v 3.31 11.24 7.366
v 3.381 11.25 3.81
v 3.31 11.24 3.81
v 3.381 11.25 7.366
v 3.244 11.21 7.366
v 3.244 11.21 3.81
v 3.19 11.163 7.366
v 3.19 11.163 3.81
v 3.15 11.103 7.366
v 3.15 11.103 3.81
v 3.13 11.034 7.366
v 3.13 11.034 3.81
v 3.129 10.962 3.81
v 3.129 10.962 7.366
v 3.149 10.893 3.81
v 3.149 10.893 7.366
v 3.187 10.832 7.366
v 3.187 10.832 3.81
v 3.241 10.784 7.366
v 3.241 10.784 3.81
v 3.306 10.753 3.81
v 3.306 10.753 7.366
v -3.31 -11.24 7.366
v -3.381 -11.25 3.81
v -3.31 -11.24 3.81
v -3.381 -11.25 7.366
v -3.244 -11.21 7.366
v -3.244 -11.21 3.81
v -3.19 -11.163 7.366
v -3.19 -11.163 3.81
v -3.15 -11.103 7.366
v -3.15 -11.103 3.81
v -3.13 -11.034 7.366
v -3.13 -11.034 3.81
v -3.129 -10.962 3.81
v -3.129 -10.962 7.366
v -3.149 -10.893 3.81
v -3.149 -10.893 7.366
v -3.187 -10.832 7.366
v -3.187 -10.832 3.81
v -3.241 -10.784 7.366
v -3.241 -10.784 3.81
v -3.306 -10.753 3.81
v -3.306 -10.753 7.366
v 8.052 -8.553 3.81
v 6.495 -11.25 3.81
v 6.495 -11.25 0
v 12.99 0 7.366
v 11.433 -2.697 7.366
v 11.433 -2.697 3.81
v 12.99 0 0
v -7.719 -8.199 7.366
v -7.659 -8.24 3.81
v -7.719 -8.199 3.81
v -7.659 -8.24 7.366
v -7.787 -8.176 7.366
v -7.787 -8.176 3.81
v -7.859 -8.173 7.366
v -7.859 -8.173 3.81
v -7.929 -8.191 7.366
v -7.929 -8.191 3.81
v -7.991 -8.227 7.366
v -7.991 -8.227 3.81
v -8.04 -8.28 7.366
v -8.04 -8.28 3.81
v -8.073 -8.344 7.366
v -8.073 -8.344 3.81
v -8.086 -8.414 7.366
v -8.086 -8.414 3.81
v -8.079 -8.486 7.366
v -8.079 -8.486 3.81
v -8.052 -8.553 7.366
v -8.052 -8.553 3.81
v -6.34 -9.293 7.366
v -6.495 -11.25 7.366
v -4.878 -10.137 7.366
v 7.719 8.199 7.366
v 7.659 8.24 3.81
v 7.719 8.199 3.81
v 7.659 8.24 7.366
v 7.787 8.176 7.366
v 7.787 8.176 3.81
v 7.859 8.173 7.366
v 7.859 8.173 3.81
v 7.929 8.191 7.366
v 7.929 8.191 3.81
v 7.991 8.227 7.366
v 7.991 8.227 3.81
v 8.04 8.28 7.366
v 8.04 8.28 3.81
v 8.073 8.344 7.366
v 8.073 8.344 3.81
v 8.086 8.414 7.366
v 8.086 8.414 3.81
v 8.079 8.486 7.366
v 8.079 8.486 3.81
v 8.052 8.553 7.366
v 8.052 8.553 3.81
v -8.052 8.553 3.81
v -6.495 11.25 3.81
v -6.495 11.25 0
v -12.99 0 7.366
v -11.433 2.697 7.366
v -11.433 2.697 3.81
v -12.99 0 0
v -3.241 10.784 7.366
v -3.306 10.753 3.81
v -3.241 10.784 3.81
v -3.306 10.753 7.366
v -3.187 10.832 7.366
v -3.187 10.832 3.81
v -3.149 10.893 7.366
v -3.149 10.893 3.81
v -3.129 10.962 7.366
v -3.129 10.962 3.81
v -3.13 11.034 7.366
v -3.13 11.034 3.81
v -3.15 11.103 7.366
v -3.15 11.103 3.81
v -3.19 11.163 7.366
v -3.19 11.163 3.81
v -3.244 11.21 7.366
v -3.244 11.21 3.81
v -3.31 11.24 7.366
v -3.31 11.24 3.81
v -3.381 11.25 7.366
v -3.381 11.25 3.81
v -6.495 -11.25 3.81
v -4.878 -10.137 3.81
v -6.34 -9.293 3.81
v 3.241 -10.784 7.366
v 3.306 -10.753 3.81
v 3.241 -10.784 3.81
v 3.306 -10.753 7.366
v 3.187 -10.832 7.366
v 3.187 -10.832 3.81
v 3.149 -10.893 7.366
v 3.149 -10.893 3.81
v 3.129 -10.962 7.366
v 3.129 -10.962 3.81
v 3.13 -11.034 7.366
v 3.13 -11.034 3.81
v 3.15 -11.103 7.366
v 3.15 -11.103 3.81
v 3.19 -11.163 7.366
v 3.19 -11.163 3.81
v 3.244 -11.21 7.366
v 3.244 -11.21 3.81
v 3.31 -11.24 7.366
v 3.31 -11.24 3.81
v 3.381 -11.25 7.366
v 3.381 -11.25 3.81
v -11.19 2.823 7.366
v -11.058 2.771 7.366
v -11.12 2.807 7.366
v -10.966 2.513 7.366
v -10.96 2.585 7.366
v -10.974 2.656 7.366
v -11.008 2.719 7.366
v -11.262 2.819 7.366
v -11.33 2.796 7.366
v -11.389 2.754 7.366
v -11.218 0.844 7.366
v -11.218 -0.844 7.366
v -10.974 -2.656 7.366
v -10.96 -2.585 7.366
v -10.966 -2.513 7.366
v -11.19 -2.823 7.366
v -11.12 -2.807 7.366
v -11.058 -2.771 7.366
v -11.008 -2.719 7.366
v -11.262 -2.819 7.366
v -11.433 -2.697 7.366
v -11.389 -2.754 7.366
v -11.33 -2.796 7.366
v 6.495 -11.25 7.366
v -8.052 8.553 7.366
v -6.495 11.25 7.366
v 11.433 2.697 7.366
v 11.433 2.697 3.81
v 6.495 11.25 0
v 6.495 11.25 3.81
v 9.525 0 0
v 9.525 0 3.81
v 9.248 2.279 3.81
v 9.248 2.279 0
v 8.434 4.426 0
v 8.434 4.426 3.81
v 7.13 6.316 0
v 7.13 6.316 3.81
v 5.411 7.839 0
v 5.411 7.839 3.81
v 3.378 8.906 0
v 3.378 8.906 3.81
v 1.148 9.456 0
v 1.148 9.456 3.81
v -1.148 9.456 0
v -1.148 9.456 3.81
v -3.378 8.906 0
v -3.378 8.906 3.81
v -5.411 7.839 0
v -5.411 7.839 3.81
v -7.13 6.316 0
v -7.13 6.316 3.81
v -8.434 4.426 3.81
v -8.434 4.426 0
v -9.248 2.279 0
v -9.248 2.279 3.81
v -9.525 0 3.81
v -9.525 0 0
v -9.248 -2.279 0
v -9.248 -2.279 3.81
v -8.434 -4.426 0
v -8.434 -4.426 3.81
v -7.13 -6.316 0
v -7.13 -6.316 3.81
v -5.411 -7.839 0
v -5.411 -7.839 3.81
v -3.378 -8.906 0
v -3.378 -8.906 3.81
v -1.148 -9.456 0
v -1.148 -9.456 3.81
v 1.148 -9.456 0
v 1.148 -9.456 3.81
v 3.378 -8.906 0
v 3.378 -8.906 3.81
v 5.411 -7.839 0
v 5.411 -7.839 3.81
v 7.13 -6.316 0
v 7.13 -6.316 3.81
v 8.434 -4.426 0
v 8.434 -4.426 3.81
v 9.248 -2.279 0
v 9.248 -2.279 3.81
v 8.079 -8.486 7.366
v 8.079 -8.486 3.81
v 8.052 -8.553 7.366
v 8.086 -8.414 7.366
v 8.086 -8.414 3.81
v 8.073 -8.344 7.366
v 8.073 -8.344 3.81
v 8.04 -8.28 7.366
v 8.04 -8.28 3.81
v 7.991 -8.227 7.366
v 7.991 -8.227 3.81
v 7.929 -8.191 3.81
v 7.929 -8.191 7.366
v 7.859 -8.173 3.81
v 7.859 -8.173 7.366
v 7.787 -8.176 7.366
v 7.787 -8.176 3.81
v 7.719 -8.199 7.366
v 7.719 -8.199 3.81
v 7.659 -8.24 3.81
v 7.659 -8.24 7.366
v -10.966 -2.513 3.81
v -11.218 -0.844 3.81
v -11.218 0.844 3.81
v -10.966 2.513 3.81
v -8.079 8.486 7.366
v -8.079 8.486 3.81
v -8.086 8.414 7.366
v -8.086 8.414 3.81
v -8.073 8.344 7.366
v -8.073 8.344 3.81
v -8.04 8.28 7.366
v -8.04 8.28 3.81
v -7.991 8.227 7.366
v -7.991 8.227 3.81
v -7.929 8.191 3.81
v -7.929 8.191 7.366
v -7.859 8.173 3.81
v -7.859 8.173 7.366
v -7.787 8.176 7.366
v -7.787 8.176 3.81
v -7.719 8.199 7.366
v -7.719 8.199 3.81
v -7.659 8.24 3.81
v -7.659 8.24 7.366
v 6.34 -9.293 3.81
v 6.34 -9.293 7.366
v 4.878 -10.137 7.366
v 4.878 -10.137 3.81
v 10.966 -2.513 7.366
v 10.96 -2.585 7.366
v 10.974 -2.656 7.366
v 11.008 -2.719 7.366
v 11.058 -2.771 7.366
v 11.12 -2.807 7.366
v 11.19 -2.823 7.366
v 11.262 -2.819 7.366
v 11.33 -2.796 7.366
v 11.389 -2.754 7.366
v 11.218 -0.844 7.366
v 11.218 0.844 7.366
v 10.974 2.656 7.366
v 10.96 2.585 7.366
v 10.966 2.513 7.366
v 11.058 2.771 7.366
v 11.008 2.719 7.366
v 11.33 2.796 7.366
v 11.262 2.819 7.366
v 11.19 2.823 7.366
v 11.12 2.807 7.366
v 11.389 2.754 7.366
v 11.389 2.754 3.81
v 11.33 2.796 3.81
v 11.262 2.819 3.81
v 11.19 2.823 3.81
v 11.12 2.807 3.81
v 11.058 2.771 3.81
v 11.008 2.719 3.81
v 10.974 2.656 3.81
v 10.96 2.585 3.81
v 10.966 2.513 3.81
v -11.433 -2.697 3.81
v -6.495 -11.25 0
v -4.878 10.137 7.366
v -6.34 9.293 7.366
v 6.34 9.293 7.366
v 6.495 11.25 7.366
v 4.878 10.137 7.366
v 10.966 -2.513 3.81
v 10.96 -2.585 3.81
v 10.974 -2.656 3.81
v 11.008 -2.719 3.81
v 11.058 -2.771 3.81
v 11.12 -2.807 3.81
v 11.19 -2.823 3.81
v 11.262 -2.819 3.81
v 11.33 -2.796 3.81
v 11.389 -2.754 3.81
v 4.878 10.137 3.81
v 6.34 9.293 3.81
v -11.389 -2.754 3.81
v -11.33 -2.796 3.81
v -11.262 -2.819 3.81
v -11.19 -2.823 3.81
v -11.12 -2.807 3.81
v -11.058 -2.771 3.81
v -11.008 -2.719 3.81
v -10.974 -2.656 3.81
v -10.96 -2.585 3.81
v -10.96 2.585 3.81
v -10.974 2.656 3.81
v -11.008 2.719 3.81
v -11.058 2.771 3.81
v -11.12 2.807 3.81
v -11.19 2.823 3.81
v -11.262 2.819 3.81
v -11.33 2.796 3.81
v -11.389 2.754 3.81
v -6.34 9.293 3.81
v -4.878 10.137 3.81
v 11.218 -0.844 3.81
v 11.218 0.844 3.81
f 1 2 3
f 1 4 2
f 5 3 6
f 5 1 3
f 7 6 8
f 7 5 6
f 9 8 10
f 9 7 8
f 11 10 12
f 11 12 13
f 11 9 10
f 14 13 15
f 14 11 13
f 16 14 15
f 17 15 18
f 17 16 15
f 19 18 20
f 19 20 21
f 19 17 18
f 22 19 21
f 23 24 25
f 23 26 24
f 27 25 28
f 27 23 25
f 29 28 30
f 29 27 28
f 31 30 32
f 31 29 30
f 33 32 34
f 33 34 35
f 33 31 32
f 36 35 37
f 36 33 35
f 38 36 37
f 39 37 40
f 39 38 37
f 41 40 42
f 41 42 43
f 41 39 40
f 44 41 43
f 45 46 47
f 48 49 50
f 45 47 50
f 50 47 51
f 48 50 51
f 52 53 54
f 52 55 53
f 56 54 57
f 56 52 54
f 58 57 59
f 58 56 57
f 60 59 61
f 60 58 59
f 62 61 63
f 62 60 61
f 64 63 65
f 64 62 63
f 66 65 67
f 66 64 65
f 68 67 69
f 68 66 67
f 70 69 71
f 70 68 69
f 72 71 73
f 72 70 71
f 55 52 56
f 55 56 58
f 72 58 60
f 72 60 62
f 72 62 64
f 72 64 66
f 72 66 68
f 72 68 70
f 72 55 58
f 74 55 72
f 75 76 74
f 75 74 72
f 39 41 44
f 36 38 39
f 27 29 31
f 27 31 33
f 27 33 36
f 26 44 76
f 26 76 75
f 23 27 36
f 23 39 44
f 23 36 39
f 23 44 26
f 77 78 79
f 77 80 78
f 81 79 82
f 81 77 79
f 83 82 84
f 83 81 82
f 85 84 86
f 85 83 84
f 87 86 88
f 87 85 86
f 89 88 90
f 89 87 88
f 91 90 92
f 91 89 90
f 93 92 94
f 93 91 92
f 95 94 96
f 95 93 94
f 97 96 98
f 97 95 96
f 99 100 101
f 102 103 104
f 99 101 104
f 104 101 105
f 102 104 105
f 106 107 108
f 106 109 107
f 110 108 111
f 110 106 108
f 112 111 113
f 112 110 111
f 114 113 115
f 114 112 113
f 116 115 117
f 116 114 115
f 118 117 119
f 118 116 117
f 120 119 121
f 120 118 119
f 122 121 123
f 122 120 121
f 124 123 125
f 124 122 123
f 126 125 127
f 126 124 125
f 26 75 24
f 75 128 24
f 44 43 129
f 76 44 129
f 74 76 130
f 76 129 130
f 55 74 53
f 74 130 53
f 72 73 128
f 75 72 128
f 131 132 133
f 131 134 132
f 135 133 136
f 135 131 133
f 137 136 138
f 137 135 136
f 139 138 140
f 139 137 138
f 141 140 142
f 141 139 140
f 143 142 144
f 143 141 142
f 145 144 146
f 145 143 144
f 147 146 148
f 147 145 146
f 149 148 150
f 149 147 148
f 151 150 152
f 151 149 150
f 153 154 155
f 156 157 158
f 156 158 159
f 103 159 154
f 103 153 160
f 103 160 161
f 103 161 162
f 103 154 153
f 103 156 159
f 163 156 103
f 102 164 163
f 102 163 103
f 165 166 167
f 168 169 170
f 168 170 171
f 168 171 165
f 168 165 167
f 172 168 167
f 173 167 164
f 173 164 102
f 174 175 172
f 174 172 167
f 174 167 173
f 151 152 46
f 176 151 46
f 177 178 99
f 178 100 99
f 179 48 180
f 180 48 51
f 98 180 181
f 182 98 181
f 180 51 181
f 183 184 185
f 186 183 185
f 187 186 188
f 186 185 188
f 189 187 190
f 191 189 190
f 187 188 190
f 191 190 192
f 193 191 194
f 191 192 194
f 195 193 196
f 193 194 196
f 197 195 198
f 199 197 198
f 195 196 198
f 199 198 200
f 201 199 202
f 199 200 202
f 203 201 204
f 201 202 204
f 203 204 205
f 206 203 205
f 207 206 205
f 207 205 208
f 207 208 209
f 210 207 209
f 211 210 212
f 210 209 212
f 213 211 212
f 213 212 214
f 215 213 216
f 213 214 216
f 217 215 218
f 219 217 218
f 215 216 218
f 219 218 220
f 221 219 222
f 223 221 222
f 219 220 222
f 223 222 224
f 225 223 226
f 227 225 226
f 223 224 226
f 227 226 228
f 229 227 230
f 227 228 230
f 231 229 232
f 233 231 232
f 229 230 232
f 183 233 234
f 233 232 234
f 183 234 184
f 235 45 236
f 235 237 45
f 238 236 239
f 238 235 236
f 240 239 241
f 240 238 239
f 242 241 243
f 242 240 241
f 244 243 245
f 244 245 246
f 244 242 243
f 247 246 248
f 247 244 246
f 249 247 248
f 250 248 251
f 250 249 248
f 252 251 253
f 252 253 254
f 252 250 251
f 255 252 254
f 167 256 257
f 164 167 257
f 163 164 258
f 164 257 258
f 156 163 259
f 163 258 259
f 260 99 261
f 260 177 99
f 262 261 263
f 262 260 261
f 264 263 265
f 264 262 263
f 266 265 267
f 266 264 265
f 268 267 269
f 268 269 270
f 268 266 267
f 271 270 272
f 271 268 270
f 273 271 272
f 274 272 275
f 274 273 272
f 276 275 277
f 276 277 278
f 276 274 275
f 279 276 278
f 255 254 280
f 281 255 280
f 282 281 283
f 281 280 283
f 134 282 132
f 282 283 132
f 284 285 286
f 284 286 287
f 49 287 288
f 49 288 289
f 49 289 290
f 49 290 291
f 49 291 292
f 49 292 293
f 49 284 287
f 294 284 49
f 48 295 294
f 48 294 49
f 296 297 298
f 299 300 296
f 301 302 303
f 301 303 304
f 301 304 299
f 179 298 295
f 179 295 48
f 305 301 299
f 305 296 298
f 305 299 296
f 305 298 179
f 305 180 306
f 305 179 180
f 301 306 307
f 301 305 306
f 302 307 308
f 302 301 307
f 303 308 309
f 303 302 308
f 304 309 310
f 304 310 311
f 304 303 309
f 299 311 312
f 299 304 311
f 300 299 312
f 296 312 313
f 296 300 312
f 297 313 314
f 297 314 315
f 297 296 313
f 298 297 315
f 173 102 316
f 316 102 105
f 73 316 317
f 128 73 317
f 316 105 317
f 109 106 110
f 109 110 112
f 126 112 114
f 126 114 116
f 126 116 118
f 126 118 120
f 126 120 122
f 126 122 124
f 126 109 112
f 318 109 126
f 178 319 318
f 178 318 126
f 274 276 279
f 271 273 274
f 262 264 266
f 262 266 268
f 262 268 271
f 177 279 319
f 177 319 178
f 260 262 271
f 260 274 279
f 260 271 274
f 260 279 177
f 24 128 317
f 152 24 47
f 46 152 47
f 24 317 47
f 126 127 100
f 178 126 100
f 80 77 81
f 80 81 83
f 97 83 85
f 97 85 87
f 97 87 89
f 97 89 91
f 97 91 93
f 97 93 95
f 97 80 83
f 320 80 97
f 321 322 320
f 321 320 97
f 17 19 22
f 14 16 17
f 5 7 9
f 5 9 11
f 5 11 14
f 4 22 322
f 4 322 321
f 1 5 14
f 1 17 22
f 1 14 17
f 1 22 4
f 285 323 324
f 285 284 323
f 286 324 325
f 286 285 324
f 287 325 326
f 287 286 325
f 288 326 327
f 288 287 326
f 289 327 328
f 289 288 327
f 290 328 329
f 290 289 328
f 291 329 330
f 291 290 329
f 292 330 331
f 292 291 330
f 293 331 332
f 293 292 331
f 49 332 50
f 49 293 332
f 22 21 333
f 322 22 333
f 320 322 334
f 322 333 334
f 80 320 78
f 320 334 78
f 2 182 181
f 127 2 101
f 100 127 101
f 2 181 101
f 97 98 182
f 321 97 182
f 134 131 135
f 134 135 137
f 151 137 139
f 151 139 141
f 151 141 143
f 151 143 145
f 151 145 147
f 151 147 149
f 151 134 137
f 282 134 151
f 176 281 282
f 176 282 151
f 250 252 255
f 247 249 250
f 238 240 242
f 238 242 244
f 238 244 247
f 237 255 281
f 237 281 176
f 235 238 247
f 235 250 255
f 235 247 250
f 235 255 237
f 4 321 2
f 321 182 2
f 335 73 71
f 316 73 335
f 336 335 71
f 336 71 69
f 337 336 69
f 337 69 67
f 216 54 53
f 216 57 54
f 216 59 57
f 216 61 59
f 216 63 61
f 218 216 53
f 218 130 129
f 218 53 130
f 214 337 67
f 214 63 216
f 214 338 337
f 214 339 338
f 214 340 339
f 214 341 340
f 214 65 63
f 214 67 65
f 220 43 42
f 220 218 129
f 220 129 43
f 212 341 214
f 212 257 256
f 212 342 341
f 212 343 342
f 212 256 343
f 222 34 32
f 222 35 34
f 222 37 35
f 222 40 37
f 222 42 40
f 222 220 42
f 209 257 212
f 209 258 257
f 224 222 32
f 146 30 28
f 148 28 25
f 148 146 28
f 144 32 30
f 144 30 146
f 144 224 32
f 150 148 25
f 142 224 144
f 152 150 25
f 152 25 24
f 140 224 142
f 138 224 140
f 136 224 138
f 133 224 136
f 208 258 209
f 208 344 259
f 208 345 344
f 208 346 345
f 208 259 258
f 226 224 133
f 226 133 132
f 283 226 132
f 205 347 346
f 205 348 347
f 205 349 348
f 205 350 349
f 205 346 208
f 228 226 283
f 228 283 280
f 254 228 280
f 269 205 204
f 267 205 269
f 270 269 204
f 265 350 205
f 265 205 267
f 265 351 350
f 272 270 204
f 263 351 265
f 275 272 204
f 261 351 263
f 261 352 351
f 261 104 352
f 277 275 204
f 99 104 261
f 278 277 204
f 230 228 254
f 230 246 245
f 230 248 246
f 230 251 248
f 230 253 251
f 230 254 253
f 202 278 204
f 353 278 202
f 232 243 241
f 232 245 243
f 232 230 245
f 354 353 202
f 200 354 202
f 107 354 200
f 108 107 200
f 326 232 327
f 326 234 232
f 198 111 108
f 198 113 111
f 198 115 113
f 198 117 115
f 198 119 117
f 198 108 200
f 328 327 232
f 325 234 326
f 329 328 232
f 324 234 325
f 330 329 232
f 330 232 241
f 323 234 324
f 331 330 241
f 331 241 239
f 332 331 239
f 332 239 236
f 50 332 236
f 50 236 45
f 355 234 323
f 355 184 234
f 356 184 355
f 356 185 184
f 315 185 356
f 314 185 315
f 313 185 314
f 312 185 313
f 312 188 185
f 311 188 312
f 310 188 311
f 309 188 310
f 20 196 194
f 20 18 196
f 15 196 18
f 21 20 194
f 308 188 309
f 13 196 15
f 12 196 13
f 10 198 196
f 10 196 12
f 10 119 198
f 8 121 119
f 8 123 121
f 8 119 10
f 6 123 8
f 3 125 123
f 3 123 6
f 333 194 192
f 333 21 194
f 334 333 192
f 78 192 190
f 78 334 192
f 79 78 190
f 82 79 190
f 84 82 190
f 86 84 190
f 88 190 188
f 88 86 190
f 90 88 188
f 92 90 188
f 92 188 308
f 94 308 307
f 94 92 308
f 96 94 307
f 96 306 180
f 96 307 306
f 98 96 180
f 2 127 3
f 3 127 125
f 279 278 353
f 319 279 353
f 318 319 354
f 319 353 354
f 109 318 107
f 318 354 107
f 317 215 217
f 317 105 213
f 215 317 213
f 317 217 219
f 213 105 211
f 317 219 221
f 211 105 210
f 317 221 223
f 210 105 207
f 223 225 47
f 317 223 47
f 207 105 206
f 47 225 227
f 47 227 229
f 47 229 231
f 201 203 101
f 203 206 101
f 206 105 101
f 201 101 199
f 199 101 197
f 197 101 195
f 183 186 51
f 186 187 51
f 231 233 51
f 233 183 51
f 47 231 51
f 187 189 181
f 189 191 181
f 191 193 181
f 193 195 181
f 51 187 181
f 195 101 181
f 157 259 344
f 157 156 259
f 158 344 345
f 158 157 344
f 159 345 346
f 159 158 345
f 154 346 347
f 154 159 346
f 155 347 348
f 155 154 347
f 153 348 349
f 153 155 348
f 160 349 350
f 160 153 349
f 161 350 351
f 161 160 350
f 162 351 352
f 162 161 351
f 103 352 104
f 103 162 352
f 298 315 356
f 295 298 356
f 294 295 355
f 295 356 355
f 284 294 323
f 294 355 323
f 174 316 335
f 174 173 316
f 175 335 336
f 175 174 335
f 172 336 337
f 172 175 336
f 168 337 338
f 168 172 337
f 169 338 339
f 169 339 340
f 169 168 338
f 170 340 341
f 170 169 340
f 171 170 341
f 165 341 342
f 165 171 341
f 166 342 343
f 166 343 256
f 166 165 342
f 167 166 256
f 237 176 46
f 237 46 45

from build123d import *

# Parameters (mm, degrees)
F1_DEPTH = 3.81
F3_DEPTH = 3.556
F4_R     = 0.254
F6_COUNT = 6
F8_R     = 9.525
F9_DEPTH = 3.81


with BuildPart() as f1:
    # F0 (on Top) → F1 (new body)
    with BuildSketch(Plane.XY):
        Polygon((6.4951905284, 11.25), (-6.4951905284, 11.25), (-12.9903810568, 0), (-6.4951905284, -11.25), (6.4951905284, -11.25), (12.9903810568, 0), align=None)
    extrude(amount=F1_DEPTH)

    # F2 (on face) → F3 (join)
    with BuildSketch(Plane.XY.offset(3.81)):
        with BuildLine():
            Line((12.9903810568, 0), (9.7427857926, 5.625))
            ThreePointArc((9.7427857926, 5.625), (11.25, 0), (9.7427857926, -5.625))
            Line((9.7427857926, -5.625), (12.9903810568, 0))
        make_face()
    extrude(amount=F3_DEPTH)

    # F4
    f4_edges = [f1.edges().sort_by_distance(p)[0] for p in [
        (9.742786, -5.625, 5.588),
        (9.742786, 5.625, 5.588),
    ]]
    fillet(f4_edges, radius=F4_R)

    # F6: F1 ×6 about axis
    f6_axis = Axis((0, 0, 19.5707920939), (0, 0, 1))


with BuildPart() as f1_1:
    add(f1.part)
    for i in range(1, F6_COUNT):
        add(f1.part.rotate(f6_axis, i * 360 / F6_COUNT))

    # F8 (on face) → F9 (cut, through all)
    with BuildSketch(Plane.XY.offset(3.81)):
        Circle(F8_R)
    extrude(amount=-F9_DEPTH, mode=Mode.SUBTRACT)


solid = f1_1.part
